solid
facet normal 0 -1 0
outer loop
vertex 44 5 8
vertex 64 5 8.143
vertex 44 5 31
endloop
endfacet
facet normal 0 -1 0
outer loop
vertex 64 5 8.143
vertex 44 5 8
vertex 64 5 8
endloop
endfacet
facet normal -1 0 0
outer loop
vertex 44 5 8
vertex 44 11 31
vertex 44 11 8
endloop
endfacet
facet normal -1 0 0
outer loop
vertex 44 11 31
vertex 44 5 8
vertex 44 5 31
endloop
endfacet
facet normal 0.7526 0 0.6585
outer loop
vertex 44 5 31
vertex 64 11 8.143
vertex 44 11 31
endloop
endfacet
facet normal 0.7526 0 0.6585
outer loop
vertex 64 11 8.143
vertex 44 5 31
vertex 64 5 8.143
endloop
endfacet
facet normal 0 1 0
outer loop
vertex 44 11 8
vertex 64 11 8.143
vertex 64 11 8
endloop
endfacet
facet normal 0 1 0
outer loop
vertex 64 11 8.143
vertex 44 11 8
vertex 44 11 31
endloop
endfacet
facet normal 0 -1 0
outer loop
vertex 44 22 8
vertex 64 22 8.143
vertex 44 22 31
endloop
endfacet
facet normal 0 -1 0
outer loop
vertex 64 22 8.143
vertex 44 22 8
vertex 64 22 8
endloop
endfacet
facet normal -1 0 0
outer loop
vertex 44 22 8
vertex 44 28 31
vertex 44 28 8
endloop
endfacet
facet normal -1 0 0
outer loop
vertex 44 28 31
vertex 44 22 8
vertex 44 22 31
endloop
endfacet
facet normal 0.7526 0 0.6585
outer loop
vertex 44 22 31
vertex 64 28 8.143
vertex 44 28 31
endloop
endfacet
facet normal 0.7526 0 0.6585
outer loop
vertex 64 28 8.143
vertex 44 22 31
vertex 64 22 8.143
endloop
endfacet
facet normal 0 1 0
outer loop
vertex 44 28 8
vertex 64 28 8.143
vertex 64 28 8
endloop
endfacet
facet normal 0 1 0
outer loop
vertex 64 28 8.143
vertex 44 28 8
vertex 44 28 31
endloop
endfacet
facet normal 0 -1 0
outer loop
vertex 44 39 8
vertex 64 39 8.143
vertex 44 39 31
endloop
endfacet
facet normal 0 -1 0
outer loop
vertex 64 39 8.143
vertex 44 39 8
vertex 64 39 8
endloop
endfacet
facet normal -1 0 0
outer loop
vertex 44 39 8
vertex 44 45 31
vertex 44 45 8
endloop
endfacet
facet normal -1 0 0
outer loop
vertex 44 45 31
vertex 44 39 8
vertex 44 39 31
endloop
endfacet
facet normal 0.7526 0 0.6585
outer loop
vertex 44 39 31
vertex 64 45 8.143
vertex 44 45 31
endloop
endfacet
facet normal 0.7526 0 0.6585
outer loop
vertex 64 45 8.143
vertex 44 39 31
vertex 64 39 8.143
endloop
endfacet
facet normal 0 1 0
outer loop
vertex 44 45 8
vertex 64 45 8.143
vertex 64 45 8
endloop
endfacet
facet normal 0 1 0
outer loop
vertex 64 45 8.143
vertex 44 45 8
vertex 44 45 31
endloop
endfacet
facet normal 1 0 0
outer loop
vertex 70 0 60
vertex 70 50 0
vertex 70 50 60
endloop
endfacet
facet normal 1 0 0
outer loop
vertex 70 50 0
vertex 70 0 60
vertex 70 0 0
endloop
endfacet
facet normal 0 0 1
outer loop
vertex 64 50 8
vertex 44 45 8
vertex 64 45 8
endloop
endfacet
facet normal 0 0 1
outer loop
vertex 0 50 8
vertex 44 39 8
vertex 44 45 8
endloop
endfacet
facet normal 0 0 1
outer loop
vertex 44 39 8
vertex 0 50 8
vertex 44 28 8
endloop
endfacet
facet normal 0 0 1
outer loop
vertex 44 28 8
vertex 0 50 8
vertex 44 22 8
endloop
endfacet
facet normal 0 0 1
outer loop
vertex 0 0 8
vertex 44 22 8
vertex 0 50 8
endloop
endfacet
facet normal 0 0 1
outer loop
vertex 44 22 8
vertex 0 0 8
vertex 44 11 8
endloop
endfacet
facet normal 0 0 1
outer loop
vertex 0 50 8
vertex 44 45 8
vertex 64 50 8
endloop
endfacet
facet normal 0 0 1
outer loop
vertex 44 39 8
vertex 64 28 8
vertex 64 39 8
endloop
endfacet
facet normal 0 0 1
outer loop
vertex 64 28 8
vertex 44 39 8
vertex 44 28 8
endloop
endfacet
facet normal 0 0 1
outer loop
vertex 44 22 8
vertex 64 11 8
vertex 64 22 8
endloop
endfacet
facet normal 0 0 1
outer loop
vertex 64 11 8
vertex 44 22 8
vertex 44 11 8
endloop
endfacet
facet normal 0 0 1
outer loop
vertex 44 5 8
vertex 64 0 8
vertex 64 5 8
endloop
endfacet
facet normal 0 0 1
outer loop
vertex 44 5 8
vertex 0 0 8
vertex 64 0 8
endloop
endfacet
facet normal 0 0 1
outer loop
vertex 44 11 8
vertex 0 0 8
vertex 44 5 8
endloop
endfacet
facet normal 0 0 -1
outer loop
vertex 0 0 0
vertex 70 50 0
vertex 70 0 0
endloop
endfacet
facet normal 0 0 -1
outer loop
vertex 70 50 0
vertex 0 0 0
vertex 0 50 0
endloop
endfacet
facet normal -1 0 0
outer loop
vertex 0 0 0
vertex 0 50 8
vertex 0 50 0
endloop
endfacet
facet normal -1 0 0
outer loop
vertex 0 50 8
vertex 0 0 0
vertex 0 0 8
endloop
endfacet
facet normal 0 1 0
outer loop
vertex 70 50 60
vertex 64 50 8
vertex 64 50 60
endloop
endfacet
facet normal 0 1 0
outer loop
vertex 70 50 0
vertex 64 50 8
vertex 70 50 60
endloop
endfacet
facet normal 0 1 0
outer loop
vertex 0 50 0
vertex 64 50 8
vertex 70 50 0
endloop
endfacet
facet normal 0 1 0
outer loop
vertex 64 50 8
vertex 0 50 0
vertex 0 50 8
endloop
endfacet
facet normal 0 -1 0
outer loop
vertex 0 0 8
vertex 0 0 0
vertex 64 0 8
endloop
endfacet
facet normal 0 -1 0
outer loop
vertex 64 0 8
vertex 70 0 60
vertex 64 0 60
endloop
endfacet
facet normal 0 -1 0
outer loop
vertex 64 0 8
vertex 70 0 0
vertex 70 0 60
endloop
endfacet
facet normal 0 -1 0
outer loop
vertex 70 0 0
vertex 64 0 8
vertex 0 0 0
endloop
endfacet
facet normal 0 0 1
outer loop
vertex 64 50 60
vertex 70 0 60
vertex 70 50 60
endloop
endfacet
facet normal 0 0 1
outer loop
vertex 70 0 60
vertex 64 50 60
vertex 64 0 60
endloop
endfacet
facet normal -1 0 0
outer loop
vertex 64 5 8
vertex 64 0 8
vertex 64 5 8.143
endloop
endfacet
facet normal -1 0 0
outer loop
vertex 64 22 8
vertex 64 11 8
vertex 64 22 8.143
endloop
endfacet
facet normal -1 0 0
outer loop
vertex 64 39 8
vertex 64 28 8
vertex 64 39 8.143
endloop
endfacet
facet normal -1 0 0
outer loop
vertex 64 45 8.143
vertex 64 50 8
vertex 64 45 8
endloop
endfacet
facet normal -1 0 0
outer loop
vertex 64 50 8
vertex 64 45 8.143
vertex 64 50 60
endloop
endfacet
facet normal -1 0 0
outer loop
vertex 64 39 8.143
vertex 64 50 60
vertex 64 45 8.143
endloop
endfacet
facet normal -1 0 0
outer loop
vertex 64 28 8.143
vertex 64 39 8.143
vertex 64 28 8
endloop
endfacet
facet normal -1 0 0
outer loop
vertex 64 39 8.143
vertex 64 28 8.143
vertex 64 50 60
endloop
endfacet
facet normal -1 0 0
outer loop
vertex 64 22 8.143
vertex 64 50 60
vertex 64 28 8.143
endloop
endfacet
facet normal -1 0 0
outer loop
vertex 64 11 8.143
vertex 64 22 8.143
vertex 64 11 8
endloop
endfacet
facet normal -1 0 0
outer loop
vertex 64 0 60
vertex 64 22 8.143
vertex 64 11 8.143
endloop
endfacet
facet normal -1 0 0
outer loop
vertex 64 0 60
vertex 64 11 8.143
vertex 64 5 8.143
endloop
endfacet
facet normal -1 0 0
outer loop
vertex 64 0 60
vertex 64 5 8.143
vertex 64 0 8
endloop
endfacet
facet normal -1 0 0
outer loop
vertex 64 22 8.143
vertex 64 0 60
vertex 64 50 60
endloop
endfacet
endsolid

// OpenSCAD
$fn = 32;

// ----------------------------------------------------------------------
// Rib bracket: 3-gusset L bracket
// ----------------------------------------------------------------------

// --- parameters (mm) ---
base_l = 70;              // foot length, X
base_w = 50;              // foot width, Y
base_t = 8;               // foot thickness
plate_t = 6;              // upright plate thickness
plate_h = 60;             // overall height
gus_l = 20;               // gusset leg along the foot
gus_h = 24;               // gusset height
gus_t = 6;                // gusset thickness
gus_edge = 5;             // gusset margin from the foot edge
n_gus = 3;                // gusset count

gus_pitch = (base_w - 2 * gus_edge - gus_t) / (n_gus - 1);  // gusset pitch

union() {
  cube([base_l, base_w, base_t]);
  translate([base_l - plate_t, 0, base_t - 1])
    cube([plate_t, base_w, plate_h - base_t + 1]);
  for (i = [0 : n_gus - 1])
    translate([base_l - plate_t - gus_l, gus_edge + i * gus_pitch, base_t - 1])
      rotate([-90, 0, 0])
        linear_extrude(height = gus_t)
          polygon(points = [[0, 0], [gus_l + 1, 0], [0, -gus_h]]);
}
